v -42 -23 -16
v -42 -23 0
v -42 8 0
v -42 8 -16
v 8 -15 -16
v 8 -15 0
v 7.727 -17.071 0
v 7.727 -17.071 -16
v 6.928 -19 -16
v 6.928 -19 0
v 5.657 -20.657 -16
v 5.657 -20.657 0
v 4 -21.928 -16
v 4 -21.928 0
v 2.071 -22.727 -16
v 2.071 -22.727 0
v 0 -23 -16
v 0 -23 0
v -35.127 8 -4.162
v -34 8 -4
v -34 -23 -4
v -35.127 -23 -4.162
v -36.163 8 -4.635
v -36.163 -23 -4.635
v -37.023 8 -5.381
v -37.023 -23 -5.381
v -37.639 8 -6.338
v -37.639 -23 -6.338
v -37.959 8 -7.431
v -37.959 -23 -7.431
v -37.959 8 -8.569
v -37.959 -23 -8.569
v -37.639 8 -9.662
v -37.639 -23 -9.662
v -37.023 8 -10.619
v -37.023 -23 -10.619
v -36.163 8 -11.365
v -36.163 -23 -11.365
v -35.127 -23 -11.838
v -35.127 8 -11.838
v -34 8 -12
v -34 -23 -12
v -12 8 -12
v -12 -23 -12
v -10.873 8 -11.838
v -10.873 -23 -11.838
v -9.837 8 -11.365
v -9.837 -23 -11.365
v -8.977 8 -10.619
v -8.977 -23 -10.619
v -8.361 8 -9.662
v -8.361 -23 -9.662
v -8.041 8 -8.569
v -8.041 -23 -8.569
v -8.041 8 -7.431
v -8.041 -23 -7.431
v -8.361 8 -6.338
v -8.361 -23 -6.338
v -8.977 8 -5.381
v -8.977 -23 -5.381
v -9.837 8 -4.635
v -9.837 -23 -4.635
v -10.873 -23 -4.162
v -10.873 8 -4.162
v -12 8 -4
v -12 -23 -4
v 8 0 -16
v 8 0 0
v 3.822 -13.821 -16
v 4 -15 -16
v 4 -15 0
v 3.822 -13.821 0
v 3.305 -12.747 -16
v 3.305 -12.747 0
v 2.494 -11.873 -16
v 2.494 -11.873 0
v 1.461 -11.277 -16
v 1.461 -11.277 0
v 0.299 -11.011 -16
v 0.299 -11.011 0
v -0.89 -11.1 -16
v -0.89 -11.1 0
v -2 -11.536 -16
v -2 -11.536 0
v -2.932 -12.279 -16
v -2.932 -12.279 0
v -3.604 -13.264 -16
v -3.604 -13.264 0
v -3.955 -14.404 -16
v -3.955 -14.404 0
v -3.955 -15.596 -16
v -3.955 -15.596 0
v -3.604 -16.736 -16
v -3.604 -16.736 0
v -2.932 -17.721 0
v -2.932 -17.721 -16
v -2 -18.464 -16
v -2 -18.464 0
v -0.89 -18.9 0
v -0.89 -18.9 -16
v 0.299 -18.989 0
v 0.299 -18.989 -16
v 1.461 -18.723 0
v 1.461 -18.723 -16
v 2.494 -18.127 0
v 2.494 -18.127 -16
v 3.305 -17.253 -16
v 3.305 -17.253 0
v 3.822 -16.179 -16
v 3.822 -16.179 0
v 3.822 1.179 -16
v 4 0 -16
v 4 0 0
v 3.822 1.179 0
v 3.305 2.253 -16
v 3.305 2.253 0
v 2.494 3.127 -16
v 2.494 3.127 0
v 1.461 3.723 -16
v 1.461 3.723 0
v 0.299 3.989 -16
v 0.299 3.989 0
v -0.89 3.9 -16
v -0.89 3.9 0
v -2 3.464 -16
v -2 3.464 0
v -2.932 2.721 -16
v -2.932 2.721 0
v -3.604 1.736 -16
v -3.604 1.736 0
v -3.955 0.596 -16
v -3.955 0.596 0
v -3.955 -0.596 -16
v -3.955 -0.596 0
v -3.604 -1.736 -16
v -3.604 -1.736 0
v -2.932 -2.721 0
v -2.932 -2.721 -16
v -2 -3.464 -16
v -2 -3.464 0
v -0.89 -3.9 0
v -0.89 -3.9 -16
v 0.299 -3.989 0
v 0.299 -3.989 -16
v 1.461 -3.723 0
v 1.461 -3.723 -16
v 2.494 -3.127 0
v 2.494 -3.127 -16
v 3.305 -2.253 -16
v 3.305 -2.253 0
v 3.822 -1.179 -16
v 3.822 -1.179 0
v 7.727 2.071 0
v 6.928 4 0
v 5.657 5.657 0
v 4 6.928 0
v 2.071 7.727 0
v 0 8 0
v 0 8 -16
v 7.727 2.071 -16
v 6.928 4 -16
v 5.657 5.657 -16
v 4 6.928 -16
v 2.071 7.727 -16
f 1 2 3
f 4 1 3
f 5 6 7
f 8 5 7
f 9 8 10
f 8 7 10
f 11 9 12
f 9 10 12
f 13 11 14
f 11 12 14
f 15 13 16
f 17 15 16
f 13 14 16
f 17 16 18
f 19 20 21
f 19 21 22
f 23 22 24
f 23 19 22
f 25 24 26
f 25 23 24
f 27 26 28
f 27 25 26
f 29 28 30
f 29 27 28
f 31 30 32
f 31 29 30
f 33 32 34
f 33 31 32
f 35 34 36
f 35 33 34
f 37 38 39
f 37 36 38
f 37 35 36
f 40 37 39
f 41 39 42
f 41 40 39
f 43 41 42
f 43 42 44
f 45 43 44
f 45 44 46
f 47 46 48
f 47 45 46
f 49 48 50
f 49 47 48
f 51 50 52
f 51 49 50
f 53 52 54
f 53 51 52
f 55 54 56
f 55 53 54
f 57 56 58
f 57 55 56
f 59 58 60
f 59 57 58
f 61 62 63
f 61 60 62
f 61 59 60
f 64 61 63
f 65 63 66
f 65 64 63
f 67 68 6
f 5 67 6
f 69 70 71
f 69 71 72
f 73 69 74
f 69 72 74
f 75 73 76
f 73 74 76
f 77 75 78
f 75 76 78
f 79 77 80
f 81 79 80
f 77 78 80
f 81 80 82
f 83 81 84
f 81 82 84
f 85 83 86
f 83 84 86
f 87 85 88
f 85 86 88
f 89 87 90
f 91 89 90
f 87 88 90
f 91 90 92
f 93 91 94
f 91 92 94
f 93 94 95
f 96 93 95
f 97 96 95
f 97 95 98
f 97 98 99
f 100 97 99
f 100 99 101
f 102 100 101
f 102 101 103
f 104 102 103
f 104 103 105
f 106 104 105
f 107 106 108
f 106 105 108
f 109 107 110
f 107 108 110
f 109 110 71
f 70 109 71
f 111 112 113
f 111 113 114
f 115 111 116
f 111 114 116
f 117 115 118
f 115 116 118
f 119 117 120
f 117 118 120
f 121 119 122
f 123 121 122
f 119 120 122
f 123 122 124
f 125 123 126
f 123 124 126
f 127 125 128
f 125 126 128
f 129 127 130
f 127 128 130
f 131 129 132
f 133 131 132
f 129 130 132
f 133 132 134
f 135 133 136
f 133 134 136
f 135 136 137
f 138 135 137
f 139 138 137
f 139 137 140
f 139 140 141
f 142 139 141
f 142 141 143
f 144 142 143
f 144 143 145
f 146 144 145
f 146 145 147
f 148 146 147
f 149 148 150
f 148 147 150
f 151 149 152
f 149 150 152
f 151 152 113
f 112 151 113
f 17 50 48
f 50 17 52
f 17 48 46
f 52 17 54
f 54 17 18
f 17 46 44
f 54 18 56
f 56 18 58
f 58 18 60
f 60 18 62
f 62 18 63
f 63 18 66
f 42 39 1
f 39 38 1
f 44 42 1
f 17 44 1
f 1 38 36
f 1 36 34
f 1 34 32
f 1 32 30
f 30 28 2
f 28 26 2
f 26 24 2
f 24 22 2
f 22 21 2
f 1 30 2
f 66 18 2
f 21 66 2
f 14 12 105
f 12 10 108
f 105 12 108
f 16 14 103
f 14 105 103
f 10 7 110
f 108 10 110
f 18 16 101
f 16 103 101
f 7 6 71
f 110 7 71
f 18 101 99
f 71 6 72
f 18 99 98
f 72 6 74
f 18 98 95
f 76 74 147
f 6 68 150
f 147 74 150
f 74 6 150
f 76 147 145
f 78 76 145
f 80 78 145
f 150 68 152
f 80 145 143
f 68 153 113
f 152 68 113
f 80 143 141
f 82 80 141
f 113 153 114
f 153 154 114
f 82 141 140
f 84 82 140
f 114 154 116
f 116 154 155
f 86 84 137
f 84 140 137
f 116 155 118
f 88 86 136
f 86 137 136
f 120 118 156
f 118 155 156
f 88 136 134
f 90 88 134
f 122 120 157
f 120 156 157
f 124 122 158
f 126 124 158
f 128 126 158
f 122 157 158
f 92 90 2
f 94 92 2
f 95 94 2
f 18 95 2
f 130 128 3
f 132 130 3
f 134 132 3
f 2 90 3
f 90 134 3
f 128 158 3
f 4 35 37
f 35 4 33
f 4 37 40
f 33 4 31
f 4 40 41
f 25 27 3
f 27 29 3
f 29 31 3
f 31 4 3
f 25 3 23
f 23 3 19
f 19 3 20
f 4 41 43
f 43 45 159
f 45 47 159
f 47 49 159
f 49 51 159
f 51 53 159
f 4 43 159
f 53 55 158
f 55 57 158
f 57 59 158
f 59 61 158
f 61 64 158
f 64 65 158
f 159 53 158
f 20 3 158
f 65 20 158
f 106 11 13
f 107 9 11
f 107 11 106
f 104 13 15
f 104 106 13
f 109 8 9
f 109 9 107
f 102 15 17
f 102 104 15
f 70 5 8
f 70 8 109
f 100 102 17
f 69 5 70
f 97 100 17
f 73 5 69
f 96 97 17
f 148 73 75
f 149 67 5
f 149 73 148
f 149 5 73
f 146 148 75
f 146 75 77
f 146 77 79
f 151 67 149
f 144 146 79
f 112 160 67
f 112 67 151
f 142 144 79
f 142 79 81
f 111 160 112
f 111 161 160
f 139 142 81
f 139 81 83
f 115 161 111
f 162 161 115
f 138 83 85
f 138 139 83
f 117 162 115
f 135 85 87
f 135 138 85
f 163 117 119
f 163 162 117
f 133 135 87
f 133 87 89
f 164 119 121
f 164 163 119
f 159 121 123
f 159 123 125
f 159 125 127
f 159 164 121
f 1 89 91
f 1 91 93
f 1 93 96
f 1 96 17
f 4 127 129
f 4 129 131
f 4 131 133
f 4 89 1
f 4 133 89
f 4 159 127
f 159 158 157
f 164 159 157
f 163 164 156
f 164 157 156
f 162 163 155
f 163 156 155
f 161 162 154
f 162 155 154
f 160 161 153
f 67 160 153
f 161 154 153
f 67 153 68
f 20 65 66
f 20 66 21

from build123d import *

# Parameters (mm, degrees)
SKETCH1_R           = 4
BOSS_EXTRUDE1_DEPTH = 16
CUT_EXTRUDE1_DEPTH  = 55.598534779


with BuildPart() as part:
    # Sketch1 → Boss-Extrude1 (new body)
    with BuildSketch(Plane.XY):
        with BuildLine():
            Line((8, 0), (8, -15))
            ThreePointArc((8, -15), (5.656854249, -20.656854249), (0, -23))
            Line((0, -23), (-42, -23))
            Line((-42, -23), (-42, 8))
            Line((-42, 8), (0, 8))
            ThreePointArc((0, 8), (5.656854249, 5.656854249), (8, 0))
        make_face()
        Circle(SKETCH1_R, mode=Mode.SUBTRACT)
        with Locations((0, -15)):
            Circle(SKETCH1_R, mode=Mode.SUBTRACT)
    extrude(amount=-BOSS_EXTRUDE1_DEPTH)

    # Sketch2 → Cut-Extrude1 (cut, through all)
    with BuildSketch(Plane(origin=(0, 8, 0), x_dir=(1, 0, 0), z_dir=(0, 1, 0))):
        with BuildLine():
            Line((-34, 12), (-12, 12))
            ThreePointArc((-12, 12), (-8, 8), (-12, 4))
            Line((-12, 4), (-34, 4))
            ThreePointArc((-34, 4), (-38, 8), (-34, 12))
        make_face()
    extrude(amount=-CUT_EXTRUDE1_DEPTH, mode=Mode.SUBTRACT)


solid = part.part
